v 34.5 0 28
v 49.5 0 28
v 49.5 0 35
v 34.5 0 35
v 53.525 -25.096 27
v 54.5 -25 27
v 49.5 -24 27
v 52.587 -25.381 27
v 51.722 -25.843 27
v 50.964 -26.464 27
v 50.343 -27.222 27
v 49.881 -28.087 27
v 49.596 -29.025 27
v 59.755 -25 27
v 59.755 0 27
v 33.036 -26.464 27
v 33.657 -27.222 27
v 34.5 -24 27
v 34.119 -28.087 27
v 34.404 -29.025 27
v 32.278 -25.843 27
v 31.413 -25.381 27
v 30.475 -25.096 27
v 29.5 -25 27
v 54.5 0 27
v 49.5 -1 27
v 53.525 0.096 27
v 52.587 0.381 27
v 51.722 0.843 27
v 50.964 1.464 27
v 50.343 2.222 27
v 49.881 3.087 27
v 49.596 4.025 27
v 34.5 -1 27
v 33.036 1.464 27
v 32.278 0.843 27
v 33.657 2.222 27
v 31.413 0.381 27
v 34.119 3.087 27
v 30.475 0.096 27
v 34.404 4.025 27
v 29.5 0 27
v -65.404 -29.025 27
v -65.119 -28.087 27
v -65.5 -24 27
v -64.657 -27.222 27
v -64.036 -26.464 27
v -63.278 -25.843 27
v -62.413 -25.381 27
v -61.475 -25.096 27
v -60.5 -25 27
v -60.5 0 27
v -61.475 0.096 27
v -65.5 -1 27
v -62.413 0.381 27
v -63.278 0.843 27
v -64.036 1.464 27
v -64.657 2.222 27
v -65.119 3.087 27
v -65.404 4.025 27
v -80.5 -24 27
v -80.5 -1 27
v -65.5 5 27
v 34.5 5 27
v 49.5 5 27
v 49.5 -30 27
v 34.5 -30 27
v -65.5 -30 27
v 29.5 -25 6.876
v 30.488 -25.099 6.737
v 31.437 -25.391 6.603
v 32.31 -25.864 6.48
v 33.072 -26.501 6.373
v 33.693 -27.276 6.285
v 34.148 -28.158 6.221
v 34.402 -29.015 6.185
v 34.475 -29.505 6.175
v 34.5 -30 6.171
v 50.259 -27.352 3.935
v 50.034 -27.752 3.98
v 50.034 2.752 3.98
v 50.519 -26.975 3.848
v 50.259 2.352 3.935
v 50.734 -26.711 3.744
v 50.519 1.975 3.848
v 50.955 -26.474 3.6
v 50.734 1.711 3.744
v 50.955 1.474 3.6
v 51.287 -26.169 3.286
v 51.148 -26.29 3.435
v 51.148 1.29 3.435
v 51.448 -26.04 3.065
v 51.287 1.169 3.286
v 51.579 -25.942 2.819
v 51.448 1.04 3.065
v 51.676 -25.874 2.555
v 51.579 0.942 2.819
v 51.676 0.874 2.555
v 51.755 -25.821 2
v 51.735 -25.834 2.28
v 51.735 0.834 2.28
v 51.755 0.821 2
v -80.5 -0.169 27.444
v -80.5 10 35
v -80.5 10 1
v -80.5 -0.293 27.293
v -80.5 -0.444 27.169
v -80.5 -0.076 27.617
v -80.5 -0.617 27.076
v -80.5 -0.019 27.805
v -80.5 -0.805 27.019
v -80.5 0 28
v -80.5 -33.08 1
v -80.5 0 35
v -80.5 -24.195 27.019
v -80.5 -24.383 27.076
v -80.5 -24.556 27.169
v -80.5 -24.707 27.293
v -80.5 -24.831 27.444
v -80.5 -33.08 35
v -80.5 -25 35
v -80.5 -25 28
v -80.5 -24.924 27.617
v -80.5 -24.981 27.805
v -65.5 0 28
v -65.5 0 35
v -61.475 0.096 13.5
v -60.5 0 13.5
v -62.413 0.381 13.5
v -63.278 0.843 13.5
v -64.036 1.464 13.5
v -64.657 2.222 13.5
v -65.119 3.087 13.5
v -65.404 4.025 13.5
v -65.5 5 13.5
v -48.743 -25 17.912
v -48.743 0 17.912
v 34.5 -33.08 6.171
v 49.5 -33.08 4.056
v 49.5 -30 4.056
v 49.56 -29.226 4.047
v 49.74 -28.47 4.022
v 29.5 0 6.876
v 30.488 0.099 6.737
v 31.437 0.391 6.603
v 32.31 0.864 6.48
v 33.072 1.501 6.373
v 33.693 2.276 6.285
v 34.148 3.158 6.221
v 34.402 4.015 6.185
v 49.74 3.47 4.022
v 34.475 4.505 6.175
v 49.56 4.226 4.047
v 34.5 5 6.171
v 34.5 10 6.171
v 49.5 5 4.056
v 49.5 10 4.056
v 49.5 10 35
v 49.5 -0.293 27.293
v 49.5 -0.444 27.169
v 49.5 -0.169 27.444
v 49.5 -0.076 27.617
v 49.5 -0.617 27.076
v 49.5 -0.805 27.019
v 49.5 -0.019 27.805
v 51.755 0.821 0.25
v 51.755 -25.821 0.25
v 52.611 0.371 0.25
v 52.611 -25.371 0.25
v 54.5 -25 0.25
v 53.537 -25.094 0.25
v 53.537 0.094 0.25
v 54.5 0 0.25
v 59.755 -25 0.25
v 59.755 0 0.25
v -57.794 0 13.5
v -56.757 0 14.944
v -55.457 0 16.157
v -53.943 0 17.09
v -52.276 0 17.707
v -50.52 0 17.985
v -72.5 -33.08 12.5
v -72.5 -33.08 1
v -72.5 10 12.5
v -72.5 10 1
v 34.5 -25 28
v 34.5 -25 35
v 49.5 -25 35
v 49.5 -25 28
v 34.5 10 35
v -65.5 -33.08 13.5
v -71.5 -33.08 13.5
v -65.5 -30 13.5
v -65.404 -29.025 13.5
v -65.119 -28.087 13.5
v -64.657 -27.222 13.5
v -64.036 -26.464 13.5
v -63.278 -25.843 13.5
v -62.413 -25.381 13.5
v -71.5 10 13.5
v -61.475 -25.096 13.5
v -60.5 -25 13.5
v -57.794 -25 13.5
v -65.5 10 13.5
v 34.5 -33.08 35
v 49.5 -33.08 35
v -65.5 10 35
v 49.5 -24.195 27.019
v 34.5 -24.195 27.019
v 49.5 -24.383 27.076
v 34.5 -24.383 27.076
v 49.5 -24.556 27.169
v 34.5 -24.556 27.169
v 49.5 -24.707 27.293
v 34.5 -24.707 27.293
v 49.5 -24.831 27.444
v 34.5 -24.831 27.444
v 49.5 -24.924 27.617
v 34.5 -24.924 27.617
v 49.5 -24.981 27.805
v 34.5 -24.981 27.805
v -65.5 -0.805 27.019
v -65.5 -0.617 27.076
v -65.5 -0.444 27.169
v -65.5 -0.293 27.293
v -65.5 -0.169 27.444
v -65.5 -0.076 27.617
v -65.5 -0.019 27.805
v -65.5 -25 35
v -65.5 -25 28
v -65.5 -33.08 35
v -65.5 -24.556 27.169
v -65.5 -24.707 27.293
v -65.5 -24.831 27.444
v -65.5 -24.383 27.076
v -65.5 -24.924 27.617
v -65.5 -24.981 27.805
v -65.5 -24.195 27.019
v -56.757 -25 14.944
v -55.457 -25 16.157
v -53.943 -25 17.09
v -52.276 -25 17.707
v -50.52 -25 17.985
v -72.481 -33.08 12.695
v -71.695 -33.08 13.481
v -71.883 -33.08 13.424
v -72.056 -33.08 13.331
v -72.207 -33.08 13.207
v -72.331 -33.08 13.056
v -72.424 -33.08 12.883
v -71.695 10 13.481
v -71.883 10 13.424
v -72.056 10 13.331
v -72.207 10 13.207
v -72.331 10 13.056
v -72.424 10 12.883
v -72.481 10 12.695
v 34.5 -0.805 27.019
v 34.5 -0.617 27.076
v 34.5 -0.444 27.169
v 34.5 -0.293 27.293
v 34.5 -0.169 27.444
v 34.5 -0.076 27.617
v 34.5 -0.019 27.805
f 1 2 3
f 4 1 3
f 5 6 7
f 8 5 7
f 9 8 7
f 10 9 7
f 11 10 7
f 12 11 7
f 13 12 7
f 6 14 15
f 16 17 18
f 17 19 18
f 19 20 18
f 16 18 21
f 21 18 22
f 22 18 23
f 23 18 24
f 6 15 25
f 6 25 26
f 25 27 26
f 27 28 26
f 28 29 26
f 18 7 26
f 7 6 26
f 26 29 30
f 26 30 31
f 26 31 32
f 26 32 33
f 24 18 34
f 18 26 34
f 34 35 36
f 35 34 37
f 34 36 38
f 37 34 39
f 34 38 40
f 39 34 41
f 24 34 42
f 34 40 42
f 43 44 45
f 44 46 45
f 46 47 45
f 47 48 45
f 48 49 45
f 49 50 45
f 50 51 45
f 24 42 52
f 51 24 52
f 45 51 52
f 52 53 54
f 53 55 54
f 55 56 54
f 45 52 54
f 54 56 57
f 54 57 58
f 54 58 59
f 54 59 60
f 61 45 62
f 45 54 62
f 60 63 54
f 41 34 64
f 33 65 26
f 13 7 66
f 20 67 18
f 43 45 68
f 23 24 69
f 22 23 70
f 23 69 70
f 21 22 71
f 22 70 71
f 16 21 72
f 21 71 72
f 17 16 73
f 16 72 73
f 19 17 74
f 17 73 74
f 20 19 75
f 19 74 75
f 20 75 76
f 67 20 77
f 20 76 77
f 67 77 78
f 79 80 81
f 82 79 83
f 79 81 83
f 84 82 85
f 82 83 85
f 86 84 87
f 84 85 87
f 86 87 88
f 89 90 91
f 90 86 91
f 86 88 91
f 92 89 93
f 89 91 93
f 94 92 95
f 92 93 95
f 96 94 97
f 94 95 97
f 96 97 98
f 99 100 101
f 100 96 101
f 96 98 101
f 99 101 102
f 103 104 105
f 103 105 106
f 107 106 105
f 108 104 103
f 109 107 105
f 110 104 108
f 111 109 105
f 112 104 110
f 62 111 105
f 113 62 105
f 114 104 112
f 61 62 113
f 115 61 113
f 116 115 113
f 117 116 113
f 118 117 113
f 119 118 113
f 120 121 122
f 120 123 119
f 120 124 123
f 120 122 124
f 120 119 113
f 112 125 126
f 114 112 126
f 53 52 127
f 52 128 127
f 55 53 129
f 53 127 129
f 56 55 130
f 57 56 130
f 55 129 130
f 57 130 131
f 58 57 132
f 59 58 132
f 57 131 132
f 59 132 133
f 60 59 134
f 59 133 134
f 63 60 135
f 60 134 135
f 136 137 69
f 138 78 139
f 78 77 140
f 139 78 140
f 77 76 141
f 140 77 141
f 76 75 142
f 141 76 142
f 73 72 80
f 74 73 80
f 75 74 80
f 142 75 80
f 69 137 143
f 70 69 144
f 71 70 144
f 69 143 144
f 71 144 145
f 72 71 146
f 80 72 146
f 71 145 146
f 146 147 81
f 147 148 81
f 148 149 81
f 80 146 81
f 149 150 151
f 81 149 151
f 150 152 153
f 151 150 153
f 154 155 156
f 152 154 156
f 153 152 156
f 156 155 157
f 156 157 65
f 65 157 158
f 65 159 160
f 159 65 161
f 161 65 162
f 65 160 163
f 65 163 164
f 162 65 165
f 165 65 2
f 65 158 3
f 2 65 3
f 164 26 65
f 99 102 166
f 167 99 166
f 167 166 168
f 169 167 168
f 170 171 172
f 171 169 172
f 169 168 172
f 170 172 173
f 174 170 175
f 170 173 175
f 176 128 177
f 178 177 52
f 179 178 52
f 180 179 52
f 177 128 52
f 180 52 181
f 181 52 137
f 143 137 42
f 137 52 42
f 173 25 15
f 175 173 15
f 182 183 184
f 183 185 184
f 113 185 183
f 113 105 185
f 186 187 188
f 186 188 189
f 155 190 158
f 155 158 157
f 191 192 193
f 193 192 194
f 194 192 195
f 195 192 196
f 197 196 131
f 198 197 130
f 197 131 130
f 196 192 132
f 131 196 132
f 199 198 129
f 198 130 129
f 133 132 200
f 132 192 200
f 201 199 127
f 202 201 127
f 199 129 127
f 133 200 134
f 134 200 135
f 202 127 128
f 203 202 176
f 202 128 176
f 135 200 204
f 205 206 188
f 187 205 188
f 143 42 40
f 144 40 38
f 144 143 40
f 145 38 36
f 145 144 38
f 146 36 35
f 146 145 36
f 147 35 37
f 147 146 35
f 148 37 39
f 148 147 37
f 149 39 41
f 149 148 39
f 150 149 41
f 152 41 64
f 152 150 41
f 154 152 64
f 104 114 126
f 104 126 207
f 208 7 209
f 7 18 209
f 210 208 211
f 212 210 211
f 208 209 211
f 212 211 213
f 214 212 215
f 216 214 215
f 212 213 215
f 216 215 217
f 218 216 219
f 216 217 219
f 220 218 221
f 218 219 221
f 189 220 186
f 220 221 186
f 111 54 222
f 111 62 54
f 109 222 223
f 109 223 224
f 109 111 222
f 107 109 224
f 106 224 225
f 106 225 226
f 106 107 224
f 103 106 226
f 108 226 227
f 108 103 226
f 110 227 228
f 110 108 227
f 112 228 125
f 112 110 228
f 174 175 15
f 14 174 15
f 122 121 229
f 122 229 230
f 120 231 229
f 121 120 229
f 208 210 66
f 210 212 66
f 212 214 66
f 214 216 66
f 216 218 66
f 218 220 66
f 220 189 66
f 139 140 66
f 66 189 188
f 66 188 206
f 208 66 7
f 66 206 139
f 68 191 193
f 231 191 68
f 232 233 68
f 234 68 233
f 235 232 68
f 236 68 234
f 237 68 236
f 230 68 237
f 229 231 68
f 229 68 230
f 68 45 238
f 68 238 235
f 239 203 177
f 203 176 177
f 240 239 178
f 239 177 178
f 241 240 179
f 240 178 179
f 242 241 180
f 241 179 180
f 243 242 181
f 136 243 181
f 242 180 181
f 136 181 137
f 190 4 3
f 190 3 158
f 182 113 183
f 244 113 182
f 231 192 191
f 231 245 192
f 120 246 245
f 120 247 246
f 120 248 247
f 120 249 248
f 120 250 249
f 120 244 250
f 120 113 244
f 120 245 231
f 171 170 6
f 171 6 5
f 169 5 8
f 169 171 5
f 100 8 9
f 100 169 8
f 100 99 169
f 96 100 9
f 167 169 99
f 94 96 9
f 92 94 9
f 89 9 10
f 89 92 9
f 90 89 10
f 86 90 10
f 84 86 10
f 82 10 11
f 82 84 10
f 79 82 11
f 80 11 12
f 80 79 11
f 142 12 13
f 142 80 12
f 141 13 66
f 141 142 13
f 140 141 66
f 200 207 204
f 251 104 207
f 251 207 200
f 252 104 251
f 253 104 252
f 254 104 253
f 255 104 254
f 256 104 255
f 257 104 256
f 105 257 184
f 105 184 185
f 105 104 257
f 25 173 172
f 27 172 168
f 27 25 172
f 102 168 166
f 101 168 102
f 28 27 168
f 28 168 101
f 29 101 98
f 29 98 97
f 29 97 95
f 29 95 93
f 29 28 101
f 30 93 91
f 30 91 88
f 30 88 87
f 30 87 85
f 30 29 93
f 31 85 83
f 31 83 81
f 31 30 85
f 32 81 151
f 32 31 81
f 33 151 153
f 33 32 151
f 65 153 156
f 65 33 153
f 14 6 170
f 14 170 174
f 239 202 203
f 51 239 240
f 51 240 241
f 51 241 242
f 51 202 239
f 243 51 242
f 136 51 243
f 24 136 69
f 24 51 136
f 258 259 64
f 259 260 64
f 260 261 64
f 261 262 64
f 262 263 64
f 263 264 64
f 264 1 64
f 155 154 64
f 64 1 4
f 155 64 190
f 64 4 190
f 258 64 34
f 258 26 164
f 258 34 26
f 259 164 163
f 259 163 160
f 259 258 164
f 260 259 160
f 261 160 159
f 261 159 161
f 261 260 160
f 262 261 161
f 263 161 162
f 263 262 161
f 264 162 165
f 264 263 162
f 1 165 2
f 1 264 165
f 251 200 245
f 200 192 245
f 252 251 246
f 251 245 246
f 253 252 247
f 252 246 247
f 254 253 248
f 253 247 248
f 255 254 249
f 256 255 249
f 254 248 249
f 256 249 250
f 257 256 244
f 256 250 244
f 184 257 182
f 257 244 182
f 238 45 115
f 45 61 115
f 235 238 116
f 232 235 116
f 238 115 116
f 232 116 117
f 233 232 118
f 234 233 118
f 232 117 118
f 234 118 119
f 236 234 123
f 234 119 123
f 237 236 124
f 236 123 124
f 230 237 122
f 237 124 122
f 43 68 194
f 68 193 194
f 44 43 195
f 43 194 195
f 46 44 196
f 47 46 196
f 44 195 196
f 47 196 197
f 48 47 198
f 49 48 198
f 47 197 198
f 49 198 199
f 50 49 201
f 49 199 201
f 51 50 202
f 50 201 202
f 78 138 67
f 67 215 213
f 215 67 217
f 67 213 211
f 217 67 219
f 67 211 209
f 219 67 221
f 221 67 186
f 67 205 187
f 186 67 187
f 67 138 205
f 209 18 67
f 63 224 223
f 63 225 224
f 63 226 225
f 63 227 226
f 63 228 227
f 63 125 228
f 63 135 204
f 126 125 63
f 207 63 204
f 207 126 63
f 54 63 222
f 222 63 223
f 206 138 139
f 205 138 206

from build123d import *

# Parameters (mm, degrees)
F1_DEPTH  = 25
F3_DEPTH  = 130
F4_DEPTH  = 25
F5_R      = 5
F7_DEPTH  = 130
F8_DEPTH  = 25
F9_R      = 5
F10_R     = 1
F11_W     = 100
F11_H     = 10
F12_DEPTH = 35
F13_W     = 100
F13_H     = 8.0795794725
F14_DEPTH = 35
F15_R     = 5
F16_R     = 1


with BuildPart() as f1:
    # F0 (on Front) → F1 (new body)
    with BuildSketch(Plane.XZ):
        with BuildLine():
            ThreePointArc((-57.7942286341, 13.5), (-53.9433654568, 17.090109324), (-48.7430907909, 17.9118))
            Line((-48.7430907909, 17.9118), (50.034012295, 3.9804))
            ThreePointArc((50.034012295, 3.9804), (51.2644385711, 3.3117495349), (51.7546991374, 2))
            Line((51.7546991374, 2), (51.7546991374, 0.25))
            Line((51.7546991374, 0.25), (59.7546991374, 0.25))
            Line((59.7546991374, 0.25), (59.7546991374, 27))
            Line((59.7546991374, 27), (-80.5, 27))
            Line((-80.5, 27), (-80.5, 1))
            Line((-80.5, 1), (-72.5, 1))
            Line((-72.5, 1), (-72.5, 13.5))
            Line((-72.5, 13.5), (-57.7942286341, 13.5))
        make_face()
    extrude(amount=F1_DEPTH)

    # F2 (on face) → F3 (join)
    with BuildSketch(Plane(origin=(-80.5, 0, 0), x_dir=(0, -1, 0), z_dir=(-1, 0, 0))):
        Polygon((0, 1), (0, 27), (0, 35), (-10, 35), (-10, 1), align=None)
    extrude(amount=-F3_DEPTH)

    # F4 (cut): a face of the model
    f4_faces = [f1.faces().sort_by_distance(p)[0] for p in [
        (-23.2155862484, 0, 7.0978499246),
    ]]
    extrude(f4_faces, amount=-F4_DEPTH, mode=Mode.SUBTRACT)

    # F5
    f5_edges = [f1.edges().sort_by_distance(p)[0] for p in [
        (49.5, 0, 15.527858),
    ]]
    fillet(f5_edges, radius=F5_R)

    # F6 (on face) → F7 (join)
    with BuildSketch(Plane(origin=(-80.5, 0, 0), x_dir=(0, -1, 0), z_dir=(-1, 0, 0))):
        Polygon((25, 35), (25, 27), (25, 1), (33.0795794725, 1), (33.0795794725, 35), align=None)
    extrude(amount=-F7_DEPTH)

    # F8 (cut): a face of the model
    f8_faces = [f1.faces().sort_by_distance(p)[0] for p in [
        (-23.2155862484, -25, 7.0978499246),
    ]]
    extrude(f8_faces, amount=-F8_DEPTH, mode=Mode.SUBTRACT)

    # F9
    f9_edges = [f1.edges().sort_by_distance(p)[0] for p in [
        (49.5, -25, 15.527858),
    ]]
    fillet(f9_edges, radius=F9_R)

    # F10
    f10_edges = [f1.edges().sort_by_distance(p)[0] for p in [
        (-72.5, -11.53979, 13.5),
    ]]
    fillet(f10_edges, radius=F10_R)

    # F11 (on face) → F12 (cut)
    with BuildSketch(Plane.XY.offset(35)):
        with Locations((-15.5, 5)):
            Rectangle(F11_W, F11_H)
    extrude(amount=-F12_DEPTH, mode=Mode.SUBTRACT)

    # F13 (on face) → F14 (cut)
    with BuildSketch(Plane.XY.offset(35)):
        with Locations((-15.5, -29.0397897363)):
            Rectangle(F13_W, F13_H)
    extrude(amount=-F14_DEPTH, mode=Mode.SUBTRACT)

    # F15
    f15_edges = [f1.edges().sort_by_distance(p)[0] for p in [
        (-65.5, -25, 20.25),
        (-65.5, 0, 20.25),
        (34.5, 0, 16.585649),
        (34.5, -25, 16.585649),
    ]]
    fillet(f15_edges, radius=F15_R)

    # F16
    f16_edges = [f1.edges().sort_by_distance(p)[0] for p in [
        (42, -25, 27),
        (-73, -25, 27),
        (-73, 0, 27),
        (42, 0, 27),
    ]]
    fillet(f16_edges, radius=F16_R)


solid = f1.part
